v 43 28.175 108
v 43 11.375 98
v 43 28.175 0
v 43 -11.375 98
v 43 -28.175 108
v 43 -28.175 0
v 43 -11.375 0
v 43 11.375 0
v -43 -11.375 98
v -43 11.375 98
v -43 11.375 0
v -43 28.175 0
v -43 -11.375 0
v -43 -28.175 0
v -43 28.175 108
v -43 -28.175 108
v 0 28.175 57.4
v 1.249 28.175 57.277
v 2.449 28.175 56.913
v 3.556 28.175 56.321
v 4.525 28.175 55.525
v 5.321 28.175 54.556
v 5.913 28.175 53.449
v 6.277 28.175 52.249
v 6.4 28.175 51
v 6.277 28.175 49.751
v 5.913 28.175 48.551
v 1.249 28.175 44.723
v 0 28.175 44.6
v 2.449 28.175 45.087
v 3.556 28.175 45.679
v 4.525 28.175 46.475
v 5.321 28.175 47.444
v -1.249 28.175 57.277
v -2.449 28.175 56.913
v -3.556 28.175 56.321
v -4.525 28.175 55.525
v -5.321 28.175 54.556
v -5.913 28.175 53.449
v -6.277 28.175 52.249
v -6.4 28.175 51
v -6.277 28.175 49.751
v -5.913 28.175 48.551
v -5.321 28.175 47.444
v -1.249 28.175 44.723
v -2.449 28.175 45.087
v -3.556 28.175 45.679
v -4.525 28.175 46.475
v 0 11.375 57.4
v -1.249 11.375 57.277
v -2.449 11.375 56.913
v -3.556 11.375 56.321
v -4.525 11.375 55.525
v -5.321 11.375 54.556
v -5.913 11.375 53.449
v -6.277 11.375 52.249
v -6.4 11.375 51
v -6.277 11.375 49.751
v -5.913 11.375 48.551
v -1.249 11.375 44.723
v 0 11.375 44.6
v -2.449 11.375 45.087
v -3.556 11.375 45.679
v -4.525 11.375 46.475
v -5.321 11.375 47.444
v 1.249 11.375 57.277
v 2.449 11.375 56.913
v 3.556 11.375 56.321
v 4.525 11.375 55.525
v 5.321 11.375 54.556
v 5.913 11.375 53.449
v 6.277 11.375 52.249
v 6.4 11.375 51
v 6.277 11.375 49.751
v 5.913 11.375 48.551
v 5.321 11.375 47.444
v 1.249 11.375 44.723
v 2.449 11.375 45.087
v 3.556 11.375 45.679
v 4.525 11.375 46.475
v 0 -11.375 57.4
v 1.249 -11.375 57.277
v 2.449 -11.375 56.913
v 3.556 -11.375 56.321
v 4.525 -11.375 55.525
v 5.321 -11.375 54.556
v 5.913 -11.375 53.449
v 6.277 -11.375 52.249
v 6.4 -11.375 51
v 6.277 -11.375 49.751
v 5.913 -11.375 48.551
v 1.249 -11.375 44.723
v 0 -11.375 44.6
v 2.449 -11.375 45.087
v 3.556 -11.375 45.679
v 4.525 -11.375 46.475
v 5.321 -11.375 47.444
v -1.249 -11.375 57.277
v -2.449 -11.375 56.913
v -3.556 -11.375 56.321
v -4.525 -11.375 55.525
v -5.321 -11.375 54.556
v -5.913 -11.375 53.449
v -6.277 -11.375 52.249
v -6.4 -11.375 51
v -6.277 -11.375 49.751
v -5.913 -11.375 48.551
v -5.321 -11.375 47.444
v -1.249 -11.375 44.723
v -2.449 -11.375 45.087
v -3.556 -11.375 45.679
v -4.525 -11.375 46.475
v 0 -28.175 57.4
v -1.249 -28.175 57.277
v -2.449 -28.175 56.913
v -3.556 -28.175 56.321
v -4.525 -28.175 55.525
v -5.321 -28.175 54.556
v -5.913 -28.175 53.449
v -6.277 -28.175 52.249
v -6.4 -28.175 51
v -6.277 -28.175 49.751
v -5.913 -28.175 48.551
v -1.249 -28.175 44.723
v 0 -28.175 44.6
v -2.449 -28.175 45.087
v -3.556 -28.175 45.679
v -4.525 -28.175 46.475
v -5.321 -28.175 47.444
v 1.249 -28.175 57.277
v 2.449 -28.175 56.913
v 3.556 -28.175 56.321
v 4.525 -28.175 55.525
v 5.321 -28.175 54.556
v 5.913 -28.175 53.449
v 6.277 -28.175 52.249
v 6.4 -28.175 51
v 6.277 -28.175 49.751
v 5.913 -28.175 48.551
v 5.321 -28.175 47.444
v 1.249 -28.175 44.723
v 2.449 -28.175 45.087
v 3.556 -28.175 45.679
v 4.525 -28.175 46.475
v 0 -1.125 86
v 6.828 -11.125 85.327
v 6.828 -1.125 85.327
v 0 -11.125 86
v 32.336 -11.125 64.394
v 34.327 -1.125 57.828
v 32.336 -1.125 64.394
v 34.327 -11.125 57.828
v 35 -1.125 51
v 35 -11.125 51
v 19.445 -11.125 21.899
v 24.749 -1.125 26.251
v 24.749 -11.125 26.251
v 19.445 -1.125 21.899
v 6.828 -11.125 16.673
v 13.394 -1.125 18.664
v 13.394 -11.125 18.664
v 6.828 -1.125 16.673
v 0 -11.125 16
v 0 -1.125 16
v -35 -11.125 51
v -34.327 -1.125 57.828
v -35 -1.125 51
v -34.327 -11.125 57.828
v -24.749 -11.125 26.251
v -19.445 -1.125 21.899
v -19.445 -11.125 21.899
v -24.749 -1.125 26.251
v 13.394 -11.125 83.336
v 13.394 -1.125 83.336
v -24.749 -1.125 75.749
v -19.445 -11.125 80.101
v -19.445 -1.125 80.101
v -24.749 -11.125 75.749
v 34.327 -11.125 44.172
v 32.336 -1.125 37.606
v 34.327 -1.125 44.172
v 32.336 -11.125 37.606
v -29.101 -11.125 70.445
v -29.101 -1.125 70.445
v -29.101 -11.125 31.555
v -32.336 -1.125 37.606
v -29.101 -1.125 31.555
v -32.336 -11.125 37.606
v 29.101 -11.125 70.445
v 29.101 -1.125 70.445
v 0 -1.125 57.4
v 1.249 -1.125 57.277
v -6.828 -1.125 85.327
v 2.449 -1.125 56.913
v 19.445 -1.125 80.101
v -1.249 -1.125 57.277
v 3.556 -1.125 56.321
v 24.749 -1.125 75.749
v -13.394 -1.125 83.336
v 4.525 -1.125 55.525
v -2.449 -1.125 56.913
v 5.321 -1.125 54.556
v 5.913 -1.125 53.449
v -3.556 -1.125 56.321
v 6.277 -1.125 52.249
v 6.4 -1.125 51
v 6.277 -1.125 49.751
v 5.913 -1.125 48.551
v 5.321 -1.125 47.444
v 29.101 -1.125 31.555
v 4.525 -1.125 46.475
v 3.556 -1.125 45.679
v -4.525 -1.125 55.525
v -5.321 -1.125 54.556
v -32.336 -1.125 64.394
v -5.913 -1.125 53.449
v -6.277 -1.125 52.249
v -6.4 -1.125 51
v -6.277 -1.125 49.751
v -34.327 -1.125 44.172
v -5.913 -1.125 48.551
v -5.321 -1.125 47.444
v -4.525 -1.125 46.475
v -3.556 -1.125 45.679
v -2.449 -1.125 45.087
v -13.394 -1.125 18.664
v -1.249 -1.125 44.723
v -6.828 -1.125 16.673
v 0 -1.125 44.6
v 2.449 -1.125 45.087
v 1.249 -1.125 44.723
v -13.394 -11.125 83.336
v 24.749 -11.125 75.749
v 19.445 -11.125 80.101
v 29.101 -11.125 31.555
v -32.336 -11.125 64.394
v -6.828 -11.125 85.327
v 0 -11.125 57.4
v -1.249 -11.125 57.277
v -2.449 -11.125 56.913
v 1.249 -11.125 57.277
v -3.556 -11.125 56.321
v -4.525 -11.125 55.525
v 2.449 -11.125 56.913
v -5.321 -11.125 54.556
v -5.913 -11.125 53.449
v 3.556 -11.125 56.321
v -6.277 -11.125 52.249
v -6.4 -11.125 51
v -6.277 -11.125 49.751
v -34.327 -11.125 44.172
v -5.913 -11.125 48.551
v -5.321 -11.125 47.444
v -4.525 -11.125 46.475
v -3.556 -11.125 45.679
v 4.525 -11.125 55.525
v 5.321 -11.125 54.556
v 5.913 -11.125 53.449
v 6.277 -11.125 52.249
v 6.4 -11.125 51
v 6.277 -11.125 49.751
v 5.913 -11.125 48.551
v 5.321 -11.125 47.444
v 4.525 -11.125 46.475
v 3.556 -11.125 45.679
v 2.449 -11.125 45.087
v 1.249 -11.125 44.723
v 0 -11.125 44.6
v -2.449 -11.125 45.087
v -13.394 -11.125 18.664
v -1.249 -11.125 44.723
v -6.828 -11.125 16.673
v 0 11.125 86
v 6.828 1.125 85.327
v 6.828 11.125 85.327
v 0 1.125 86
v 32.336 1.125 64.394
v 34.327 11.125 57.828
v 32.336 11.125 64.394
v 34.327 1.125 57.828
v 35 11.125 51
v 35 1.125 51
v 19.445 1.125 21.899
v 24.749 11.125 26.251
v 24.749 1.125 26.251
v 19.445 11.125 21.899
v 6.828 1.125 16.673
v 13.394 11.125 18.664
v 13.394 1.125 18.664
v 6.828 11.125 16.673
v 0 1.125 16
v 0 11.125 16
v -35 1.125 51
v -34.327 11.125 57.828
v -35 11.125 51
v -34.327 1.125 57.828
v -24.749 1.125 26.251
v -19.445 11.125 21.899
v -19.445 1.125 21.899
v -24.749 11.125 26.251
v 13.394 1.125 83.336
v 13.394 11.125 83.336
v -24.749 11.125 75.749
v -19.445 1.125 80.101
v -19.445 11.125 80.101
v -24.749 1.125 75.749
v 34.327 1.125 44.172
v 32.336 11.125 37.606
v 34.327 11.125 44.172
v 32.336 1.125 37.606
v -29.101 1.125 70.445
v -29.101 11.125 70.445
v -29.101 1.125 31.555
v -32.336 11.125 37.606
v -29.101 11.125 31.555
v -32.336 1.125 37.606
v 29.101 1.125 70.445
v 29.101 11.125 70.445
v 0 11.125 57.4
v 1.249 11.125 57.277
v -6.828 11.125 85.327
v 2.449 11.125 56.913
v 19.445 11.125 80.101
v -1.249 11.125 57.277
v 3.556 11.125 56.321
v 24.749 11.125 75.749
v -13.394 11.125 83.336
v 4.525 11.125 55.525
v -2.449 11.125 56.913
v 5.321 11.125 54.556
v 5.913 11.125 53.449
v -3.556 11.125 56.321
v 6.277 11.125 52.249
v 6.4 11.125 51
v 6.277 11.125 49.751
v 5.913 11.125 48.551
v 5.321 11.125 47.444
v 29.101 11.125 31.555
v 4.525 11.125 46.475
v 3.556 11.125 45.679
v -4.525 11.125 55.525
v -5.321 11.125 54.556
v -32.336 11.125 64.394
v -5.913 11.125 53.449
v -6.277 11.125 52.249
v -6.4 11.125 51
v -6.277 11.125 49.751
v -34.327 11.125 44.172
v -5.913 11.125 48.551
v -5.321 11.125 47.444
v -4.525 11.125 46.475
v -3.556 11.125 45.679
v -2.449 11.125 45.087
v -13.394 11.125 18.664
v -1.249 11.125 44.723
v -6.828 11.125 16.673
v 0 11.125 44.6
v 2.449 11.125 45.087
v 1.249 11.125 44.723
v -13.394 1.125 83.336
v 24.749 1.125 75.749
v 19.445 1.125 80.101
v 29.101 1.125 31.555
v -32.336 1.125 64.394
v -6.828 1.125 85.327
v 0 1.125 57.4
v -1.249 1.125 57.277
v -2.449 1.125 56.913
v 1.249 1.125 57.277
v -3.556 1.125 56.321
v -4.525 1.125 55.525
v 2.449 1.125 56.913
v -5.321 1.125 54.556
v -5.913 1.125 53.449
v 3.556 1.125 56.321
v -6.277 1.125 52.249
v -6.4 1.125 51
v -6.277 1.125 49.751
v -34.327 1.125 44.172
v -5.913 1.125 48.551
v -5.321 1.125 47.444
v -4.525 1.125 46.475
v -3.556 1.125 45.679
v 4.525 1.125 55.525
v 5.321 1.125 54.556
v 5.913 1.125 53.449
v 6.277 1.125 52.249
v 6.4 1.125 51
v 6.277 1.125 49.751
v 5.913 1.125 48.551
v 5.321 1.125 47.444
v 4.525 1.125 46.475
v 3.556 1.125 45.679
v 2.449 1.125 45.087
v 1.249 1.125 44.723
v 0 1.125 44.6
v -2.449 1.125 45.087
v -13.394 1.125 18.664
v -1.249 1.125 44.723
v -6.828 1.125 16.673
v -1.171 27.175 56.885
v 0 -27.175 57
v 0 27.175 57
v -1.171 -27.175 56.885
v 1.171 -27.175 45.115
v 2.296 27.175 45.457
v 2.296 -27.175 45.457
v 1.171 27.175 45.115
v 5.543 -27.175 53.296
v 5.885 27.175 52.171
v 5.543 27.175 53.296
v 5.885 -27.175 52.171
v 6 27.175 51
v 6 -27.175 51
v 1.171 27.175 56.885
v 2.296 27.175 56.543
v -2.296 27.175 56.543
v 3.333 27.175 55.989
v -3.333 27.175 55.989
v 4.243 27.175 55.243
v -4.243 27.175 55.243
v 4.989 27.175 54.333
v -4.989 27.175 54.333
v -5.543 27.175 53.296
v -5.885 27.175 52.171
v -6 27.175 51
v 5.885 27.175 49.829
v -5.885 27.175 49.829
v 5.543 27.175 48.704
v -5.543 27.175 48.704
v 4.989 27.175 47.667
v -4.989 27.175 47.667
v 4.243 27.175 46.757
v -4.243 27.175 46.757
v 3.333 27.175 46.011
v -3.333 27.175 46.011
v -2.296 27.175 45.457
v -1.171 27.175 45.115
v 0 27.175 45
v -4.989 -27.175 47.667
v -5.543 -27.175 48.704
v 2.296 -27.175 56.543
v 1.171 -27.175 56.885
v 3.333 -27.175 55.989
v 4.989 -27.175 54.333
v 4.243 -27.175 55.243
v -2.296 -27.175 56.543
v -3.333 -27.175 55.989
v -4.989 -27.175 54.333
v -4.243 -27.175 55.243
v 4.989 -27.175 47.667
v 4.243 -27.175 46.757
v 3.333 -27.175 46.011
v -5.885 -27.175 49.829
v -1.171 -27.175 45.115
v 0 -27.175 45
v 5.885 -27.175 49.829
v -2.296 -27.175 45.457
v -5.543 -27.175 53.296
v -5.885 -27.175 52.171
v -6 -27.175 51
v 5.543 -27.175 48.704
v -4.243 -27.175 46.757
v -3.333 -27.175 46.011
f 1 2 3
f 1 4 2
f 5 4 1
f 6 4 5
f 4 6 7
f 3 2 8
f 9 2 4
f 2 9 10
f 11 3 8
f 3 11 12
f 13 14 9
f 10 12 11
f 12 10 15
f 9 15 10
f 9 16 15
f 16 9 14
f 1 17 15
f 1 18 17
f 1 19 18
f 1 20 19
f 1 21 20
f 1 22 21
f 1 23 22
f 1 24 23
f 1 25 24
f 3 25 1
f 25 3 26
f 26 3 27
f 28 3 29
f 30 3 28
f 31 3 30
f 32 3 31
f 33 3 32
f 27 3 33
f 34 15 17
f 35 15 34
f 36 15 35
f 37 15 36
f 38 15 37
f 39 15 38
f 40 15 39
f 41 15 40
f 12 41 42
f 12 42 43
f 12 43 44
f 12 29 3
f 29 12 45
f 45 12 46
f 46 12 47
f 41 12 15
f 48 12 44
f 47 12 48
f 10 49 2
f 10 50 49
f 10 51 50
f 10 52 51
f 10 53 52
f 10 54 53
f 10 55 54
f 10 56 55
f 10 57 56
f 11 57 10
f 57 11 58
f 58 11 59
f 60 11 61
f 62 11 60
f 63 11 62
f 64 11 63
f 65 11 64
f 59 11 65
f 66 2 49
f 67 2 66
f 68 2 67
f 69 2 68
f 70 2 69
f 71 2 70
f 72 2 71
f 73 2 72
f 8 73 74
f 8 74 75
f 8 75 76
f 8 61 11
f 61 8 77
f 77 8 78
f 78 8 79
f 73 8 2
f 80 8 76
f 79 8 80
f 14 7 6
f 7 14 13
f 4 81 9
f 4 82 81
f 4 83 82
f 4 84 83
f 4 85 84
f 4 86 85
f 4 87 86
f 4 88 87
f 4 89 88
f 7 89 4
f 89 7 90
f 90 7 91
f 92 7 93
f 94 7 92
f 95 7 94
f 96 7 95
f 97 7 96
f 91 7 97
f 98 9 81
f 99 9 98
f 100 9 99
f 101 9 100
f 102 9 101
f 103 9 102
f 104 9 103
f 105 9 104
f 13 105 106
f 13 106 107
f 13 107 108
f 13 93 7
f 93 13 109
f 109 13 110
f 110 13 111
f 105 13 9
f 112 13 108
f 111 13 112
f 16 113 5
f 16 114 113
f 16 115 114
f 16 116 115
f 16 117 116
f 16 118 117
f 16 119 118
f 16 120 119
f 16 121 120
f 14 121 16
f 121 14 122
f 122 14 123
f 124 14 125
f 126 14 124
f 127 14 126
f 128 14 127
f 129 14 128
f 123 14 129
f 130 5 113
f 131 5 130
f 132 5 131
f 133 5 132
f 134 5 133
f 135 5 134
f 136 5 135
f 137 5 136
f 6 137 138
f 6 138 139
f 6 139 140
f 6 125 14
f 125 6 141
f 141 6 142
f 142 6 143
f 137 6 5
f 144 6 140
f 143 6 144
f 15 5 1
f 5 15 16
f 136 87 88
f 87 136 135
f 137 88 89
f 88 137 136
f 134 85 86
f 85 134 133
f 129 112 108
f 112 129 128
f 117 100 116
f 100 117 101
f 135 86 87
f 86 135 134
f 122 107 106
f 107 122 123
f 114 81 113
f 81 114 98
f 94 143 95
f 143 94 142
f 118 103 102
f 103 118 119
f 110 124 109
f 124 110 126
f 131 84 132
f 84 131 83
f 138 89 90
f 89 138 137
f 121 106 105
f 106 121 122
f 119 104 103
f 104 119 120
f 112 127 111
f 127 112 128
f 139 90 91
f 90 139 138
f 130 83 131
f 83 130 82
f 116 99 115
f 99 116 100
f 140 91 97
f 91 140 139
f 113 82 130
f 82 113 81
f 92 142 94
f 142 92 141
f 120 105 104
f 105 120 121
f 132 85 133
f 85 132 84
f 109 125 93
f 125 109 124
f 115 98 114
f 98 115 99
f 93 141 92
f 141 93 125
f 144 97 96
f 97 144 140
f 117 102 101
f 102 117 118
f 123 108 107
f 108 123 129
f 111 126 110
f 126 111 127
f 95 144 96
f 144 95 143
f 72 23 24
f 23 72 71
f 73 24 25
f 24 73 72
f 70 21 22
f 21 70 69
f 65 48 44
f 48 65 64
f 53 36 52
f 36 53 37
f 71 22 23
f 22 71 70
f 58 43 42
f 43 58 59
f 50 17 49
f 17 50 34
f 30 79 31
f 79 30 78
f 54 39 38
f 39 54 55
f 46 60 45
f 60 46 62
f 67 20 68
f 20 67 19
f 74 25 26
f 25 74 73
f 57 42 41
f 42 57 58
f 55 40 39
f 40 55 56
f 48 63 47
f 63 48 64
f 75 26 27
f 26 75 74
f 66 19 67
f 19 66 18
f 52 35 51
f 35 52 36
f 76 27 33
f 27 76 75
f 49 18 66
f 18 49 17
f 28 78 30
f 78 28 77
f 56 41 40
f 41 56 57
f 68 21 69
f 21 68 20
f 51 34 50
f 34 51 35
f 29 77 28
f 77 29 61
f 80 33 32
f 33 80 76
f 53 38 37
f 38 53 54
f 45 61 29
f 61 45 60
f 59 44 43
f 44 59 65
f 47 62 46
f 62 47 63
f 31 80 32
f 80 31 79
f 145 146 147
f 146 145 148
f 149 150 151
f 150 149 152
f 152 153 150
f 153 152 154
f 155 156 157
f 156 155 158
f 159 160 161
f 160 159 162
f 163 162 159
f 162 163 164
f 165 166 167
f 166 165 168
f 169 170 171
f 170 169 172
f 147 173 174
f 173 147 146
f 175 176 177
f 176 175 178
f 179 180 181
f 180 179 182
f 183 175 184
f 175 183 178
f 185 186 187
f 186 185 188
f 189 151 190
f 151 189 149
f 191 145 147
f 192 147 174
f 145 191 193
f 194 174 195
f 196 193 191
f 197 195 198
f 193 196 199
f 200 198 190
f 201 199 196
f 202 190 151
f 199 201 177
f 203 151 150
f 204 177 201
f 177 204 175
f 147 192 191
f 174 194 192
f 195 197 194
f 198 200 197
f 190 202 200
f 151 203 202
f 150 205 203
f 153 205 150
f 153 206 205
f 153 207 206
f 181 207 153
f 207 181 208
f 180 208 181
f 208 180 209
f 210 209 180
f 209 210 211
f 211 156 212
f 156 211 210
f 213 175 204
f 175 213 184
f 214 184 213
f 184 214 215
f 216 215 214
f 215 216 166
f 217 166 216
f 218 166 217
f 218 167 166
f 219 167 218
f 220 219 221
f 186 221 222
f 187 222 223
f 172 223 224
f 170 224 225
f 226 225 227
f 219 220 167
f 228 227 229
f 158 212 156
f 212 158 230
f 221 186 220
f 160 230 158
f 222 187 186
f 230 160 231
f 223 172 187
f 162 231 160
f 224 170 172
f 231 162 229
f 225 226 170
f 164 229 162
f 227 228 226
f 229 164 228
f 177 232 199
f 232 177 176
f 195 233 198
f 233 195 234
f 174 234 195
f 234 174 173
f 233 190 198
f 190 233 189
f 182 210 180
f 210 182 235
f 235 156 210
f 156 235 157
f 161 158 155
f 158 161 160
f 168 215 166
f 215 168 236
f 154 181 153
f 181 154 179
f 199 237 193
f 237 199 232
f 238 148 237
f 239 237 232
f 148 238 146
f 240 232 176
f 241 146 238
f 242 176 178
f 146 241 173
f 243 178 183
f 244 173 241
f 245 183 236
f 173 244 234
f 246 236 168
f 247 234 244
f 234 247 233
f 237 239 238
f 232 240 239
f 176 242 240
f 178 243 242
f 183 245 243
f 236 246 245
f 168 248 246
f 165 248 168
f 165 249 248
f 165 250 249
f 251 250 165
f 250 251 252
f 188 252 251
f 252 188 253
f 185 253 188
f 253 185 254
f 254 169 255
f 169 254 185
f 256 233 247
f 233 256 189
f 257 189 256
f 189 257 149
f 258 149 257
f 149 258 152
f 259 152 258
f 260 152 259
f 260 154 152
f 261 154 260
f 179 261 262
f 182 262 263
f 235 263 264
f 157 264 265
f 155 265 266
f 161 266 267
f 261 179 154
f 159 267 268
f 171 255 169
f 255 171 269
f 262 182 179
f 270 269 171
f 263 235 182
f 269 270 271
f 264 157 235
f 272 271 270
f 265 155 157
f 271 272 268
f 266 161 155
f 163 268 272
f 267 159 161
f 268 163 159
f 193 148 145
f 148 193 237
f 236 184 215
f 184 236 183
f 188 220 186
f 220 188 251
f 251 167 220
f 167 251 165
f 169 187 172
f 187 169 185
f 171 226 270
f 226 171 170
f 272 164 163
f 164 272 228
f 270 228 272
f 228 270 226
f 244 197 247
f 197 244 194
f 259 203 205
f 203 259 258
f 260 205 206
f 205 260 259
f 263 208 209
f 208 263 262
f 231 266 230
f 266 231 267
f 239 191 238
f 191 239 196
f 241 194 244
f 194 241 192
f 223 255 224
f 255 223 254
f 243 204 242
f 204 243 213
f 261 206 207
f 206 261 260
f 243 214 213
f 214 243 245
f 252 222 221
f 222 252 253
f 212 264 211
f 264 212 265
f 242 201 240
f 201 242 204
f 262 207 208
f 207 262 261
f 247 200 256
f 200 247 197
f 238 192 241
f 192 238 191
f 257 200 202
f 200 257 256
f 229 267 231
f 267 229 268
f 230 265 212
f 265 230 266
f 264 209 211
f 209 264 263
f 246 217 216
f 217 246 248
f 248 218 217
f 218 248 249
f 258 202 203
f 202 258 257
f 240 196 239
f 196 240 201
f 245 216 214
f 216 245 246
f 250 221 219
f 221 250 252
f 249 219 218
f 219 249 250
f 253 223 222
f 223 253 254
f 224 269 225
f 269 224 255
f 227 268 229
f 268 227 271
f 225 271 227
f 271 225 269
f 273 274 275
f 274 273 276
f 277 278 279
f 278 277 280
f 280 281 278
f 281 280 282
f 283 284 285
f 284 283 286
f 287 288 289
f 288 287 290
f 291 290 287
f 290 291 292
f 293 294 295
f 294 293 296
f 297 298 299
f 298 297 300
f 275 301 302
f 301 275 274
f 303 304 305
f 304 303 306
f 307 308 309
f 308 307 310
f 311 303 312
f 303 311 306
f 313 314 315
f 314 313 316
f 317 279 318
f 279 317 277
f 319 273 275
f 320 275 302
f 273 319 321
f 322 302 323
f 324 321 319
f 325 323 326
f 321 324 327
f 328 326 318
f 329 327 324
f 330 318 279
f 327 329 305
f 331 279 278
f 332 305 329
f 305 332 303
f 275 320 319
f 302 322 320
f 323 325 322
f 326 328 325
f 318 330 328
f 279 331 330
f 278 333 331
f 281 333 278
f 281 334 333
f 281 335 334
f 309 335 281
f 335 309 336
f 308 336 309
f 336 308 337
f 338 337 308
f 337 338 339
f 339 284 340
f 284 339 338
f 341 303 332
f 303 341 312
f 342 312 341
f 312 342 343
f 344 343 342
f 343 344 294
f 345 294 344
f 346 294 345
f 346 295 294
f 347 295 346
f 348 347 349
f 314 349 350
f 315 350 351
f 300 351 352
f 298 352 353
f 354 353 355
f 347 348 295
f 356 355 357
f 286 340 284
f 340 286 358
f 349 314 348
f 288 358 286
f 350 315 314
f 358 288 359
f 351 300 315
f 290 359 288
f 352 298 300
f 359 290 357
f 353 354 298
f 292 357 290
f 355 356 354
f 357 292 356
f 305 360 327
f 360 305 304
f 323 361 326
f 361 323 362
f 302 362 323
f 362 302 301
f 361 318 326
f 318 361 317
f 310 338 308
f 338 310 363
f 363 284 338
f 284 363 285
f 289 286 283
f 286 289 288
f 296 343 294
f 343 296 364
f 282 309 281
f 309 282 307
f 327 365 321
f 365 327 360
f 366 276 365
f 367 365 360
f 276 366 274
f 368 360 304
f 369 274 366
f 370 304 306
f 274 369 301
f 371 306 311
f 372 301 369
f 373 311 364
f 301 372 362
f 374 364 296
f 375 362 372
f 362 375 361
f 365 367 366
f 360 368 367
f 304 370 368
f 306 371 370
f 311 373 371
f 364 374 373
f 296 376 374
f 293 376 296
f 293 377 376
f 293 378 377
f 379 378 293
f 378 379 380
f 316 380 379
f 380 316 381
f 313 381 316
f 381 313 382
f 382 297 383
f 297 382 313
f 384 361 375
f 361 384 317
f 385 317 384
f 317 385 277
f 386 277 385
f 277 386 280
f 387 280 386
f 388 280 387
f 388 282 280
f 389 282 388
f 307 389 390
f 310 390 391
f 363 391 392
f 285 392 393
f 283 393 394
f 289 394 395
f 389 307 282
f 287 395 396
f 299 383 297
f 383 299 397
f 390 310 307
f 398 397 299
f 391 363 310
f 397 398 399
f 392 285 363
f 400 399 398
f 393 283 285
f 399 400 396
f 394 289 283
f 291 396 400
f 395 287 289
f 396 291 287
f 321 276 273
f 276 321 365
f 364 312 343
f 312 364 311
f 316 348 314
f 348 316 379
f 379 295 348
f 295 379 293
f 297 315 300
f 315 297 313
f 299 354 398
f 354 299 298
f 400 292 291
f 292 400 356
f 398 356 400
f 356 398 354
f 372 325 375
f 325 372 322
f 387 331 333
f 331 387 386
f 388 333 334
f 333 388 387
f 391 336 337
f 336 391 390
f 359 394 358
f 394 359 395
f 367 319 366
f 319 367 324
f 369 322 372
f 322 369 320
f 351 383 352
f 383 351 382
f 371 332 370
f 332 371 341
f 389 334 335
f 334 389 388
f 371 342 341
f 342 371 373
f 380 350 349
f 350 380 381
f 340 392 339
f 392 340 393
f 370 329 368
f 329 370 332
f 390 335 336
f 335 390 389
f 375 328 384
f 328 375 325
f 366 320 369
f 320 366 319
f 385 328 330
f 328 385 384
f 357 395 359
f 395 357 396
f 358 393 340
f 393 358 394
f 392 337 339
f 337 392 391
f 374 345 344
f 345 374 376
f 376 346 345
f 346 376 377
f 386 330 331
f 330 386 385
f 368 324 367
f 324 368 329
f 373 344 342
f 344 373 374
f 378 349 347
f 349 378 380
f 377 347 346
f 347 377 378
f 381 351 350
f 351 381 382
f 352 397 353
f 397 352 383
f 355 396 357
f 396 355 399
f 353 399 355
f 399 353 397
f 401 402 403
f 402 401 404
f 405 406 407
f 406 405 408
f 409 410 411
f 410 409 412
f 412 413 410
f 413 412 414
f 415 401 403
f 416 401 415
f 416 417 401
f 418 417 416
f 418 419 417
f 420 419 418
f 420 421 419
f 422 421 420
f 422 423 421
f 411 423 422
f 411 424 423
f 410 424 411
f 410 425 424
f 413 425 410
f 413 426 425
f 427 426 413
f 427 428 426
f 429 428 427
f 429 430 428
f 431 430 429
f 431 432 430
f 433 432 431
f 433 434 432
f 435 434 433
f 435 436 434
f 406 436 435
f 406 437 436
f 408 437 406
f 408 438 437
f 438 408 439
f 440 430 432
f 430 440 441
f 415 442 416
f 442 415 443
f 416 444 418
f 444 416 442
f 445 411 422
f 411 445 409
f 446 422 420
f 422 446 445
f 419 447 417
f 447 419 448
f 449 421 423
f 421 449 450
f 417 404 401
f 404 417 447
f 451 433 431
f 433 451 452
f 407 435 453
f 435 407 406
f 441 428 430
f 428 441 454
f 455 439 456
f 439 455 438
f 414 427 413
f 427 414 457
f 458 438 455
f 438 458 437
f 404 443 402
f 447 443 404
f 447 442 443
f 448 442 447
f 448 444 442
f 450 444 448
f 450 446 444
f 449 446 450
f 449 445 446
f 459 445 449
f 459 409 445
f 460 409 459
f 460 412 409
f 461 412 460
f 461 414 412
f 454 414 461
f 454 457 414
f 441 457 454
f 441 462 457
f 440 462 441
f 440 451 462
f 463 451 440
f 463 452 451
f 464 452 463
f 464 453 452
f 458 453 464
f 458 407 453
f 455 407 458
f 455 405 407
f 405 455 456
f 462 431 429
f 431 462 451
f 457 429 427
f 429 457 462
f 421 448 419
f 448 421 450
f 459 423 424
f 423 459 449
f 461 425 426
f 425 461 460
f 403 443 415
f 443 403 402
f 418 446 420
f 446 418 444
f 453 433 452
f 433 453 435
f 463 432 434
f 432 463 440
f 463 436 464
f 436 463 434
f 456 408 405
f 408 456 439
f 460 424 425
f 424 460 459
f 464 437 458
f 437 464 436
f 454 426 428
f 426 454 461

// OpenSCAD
$fn = 32;

// ------------------------------------------------------------------------
// Trolley wheel set: wheels d70, fork 98 mm tall
// Every part is its own module, assembly() places every instance.
// ------------------------------------------------------------------------

// --- part 1 ---
module trolley_fork() {
  difference() {
    union() {
      translate([-43, 11.375, 0]) cube([86, 16.8, 98]);
      translate([-43, -28.175, 0]) cube([86, 16.8, 98]);
      translate([-43, -28.175, 98]) cube([86, 56.35, 10]);
    }
    translate([0, -19.775, 51]) rotate([90, 0, 0]) cylinder(h = 18.8, d = 12.8, center = true);
    translate([0, 19.775, 51]) rotate([90, 0, 0]) cylinder(h = 18.8, d = 12.8, center = true);
  }
}

// --- part 2 ---
module trolley_wheel() {
  difference() {
      translate([0, 0, 0]) cylinder(h = 10, d = 70);
      translate([0, 0, -1]) cylinder(h = 12, d = 12.8);
    }
}

// --- part 3 ---
module trolley_axle() {
  translate([0, 0, -27.175]) cylinder(h = 54.35, d = 12);
}

// --- assembly ---
module assembly() {
  color([0.80, 0.24, 0.20]) translate([0, 0, 0]) rotate([0, 0, 0]) trolley_fork();
  color([0.20, 0.45, 0.75]) translate([0, -1.125, 51]) rotate([90, 0, 0]) trolley_wheel();
  color([0.25, 0.62, 0.32]) translate([0, 11.125, 51]) rotate([90, 0, 0]) trolley_wheel();
  color([0.92, 0.70, 0.18]) translate([0, 0, 51]) rotate([90, 0, 0]) trolley_axle();
}

assembly();
